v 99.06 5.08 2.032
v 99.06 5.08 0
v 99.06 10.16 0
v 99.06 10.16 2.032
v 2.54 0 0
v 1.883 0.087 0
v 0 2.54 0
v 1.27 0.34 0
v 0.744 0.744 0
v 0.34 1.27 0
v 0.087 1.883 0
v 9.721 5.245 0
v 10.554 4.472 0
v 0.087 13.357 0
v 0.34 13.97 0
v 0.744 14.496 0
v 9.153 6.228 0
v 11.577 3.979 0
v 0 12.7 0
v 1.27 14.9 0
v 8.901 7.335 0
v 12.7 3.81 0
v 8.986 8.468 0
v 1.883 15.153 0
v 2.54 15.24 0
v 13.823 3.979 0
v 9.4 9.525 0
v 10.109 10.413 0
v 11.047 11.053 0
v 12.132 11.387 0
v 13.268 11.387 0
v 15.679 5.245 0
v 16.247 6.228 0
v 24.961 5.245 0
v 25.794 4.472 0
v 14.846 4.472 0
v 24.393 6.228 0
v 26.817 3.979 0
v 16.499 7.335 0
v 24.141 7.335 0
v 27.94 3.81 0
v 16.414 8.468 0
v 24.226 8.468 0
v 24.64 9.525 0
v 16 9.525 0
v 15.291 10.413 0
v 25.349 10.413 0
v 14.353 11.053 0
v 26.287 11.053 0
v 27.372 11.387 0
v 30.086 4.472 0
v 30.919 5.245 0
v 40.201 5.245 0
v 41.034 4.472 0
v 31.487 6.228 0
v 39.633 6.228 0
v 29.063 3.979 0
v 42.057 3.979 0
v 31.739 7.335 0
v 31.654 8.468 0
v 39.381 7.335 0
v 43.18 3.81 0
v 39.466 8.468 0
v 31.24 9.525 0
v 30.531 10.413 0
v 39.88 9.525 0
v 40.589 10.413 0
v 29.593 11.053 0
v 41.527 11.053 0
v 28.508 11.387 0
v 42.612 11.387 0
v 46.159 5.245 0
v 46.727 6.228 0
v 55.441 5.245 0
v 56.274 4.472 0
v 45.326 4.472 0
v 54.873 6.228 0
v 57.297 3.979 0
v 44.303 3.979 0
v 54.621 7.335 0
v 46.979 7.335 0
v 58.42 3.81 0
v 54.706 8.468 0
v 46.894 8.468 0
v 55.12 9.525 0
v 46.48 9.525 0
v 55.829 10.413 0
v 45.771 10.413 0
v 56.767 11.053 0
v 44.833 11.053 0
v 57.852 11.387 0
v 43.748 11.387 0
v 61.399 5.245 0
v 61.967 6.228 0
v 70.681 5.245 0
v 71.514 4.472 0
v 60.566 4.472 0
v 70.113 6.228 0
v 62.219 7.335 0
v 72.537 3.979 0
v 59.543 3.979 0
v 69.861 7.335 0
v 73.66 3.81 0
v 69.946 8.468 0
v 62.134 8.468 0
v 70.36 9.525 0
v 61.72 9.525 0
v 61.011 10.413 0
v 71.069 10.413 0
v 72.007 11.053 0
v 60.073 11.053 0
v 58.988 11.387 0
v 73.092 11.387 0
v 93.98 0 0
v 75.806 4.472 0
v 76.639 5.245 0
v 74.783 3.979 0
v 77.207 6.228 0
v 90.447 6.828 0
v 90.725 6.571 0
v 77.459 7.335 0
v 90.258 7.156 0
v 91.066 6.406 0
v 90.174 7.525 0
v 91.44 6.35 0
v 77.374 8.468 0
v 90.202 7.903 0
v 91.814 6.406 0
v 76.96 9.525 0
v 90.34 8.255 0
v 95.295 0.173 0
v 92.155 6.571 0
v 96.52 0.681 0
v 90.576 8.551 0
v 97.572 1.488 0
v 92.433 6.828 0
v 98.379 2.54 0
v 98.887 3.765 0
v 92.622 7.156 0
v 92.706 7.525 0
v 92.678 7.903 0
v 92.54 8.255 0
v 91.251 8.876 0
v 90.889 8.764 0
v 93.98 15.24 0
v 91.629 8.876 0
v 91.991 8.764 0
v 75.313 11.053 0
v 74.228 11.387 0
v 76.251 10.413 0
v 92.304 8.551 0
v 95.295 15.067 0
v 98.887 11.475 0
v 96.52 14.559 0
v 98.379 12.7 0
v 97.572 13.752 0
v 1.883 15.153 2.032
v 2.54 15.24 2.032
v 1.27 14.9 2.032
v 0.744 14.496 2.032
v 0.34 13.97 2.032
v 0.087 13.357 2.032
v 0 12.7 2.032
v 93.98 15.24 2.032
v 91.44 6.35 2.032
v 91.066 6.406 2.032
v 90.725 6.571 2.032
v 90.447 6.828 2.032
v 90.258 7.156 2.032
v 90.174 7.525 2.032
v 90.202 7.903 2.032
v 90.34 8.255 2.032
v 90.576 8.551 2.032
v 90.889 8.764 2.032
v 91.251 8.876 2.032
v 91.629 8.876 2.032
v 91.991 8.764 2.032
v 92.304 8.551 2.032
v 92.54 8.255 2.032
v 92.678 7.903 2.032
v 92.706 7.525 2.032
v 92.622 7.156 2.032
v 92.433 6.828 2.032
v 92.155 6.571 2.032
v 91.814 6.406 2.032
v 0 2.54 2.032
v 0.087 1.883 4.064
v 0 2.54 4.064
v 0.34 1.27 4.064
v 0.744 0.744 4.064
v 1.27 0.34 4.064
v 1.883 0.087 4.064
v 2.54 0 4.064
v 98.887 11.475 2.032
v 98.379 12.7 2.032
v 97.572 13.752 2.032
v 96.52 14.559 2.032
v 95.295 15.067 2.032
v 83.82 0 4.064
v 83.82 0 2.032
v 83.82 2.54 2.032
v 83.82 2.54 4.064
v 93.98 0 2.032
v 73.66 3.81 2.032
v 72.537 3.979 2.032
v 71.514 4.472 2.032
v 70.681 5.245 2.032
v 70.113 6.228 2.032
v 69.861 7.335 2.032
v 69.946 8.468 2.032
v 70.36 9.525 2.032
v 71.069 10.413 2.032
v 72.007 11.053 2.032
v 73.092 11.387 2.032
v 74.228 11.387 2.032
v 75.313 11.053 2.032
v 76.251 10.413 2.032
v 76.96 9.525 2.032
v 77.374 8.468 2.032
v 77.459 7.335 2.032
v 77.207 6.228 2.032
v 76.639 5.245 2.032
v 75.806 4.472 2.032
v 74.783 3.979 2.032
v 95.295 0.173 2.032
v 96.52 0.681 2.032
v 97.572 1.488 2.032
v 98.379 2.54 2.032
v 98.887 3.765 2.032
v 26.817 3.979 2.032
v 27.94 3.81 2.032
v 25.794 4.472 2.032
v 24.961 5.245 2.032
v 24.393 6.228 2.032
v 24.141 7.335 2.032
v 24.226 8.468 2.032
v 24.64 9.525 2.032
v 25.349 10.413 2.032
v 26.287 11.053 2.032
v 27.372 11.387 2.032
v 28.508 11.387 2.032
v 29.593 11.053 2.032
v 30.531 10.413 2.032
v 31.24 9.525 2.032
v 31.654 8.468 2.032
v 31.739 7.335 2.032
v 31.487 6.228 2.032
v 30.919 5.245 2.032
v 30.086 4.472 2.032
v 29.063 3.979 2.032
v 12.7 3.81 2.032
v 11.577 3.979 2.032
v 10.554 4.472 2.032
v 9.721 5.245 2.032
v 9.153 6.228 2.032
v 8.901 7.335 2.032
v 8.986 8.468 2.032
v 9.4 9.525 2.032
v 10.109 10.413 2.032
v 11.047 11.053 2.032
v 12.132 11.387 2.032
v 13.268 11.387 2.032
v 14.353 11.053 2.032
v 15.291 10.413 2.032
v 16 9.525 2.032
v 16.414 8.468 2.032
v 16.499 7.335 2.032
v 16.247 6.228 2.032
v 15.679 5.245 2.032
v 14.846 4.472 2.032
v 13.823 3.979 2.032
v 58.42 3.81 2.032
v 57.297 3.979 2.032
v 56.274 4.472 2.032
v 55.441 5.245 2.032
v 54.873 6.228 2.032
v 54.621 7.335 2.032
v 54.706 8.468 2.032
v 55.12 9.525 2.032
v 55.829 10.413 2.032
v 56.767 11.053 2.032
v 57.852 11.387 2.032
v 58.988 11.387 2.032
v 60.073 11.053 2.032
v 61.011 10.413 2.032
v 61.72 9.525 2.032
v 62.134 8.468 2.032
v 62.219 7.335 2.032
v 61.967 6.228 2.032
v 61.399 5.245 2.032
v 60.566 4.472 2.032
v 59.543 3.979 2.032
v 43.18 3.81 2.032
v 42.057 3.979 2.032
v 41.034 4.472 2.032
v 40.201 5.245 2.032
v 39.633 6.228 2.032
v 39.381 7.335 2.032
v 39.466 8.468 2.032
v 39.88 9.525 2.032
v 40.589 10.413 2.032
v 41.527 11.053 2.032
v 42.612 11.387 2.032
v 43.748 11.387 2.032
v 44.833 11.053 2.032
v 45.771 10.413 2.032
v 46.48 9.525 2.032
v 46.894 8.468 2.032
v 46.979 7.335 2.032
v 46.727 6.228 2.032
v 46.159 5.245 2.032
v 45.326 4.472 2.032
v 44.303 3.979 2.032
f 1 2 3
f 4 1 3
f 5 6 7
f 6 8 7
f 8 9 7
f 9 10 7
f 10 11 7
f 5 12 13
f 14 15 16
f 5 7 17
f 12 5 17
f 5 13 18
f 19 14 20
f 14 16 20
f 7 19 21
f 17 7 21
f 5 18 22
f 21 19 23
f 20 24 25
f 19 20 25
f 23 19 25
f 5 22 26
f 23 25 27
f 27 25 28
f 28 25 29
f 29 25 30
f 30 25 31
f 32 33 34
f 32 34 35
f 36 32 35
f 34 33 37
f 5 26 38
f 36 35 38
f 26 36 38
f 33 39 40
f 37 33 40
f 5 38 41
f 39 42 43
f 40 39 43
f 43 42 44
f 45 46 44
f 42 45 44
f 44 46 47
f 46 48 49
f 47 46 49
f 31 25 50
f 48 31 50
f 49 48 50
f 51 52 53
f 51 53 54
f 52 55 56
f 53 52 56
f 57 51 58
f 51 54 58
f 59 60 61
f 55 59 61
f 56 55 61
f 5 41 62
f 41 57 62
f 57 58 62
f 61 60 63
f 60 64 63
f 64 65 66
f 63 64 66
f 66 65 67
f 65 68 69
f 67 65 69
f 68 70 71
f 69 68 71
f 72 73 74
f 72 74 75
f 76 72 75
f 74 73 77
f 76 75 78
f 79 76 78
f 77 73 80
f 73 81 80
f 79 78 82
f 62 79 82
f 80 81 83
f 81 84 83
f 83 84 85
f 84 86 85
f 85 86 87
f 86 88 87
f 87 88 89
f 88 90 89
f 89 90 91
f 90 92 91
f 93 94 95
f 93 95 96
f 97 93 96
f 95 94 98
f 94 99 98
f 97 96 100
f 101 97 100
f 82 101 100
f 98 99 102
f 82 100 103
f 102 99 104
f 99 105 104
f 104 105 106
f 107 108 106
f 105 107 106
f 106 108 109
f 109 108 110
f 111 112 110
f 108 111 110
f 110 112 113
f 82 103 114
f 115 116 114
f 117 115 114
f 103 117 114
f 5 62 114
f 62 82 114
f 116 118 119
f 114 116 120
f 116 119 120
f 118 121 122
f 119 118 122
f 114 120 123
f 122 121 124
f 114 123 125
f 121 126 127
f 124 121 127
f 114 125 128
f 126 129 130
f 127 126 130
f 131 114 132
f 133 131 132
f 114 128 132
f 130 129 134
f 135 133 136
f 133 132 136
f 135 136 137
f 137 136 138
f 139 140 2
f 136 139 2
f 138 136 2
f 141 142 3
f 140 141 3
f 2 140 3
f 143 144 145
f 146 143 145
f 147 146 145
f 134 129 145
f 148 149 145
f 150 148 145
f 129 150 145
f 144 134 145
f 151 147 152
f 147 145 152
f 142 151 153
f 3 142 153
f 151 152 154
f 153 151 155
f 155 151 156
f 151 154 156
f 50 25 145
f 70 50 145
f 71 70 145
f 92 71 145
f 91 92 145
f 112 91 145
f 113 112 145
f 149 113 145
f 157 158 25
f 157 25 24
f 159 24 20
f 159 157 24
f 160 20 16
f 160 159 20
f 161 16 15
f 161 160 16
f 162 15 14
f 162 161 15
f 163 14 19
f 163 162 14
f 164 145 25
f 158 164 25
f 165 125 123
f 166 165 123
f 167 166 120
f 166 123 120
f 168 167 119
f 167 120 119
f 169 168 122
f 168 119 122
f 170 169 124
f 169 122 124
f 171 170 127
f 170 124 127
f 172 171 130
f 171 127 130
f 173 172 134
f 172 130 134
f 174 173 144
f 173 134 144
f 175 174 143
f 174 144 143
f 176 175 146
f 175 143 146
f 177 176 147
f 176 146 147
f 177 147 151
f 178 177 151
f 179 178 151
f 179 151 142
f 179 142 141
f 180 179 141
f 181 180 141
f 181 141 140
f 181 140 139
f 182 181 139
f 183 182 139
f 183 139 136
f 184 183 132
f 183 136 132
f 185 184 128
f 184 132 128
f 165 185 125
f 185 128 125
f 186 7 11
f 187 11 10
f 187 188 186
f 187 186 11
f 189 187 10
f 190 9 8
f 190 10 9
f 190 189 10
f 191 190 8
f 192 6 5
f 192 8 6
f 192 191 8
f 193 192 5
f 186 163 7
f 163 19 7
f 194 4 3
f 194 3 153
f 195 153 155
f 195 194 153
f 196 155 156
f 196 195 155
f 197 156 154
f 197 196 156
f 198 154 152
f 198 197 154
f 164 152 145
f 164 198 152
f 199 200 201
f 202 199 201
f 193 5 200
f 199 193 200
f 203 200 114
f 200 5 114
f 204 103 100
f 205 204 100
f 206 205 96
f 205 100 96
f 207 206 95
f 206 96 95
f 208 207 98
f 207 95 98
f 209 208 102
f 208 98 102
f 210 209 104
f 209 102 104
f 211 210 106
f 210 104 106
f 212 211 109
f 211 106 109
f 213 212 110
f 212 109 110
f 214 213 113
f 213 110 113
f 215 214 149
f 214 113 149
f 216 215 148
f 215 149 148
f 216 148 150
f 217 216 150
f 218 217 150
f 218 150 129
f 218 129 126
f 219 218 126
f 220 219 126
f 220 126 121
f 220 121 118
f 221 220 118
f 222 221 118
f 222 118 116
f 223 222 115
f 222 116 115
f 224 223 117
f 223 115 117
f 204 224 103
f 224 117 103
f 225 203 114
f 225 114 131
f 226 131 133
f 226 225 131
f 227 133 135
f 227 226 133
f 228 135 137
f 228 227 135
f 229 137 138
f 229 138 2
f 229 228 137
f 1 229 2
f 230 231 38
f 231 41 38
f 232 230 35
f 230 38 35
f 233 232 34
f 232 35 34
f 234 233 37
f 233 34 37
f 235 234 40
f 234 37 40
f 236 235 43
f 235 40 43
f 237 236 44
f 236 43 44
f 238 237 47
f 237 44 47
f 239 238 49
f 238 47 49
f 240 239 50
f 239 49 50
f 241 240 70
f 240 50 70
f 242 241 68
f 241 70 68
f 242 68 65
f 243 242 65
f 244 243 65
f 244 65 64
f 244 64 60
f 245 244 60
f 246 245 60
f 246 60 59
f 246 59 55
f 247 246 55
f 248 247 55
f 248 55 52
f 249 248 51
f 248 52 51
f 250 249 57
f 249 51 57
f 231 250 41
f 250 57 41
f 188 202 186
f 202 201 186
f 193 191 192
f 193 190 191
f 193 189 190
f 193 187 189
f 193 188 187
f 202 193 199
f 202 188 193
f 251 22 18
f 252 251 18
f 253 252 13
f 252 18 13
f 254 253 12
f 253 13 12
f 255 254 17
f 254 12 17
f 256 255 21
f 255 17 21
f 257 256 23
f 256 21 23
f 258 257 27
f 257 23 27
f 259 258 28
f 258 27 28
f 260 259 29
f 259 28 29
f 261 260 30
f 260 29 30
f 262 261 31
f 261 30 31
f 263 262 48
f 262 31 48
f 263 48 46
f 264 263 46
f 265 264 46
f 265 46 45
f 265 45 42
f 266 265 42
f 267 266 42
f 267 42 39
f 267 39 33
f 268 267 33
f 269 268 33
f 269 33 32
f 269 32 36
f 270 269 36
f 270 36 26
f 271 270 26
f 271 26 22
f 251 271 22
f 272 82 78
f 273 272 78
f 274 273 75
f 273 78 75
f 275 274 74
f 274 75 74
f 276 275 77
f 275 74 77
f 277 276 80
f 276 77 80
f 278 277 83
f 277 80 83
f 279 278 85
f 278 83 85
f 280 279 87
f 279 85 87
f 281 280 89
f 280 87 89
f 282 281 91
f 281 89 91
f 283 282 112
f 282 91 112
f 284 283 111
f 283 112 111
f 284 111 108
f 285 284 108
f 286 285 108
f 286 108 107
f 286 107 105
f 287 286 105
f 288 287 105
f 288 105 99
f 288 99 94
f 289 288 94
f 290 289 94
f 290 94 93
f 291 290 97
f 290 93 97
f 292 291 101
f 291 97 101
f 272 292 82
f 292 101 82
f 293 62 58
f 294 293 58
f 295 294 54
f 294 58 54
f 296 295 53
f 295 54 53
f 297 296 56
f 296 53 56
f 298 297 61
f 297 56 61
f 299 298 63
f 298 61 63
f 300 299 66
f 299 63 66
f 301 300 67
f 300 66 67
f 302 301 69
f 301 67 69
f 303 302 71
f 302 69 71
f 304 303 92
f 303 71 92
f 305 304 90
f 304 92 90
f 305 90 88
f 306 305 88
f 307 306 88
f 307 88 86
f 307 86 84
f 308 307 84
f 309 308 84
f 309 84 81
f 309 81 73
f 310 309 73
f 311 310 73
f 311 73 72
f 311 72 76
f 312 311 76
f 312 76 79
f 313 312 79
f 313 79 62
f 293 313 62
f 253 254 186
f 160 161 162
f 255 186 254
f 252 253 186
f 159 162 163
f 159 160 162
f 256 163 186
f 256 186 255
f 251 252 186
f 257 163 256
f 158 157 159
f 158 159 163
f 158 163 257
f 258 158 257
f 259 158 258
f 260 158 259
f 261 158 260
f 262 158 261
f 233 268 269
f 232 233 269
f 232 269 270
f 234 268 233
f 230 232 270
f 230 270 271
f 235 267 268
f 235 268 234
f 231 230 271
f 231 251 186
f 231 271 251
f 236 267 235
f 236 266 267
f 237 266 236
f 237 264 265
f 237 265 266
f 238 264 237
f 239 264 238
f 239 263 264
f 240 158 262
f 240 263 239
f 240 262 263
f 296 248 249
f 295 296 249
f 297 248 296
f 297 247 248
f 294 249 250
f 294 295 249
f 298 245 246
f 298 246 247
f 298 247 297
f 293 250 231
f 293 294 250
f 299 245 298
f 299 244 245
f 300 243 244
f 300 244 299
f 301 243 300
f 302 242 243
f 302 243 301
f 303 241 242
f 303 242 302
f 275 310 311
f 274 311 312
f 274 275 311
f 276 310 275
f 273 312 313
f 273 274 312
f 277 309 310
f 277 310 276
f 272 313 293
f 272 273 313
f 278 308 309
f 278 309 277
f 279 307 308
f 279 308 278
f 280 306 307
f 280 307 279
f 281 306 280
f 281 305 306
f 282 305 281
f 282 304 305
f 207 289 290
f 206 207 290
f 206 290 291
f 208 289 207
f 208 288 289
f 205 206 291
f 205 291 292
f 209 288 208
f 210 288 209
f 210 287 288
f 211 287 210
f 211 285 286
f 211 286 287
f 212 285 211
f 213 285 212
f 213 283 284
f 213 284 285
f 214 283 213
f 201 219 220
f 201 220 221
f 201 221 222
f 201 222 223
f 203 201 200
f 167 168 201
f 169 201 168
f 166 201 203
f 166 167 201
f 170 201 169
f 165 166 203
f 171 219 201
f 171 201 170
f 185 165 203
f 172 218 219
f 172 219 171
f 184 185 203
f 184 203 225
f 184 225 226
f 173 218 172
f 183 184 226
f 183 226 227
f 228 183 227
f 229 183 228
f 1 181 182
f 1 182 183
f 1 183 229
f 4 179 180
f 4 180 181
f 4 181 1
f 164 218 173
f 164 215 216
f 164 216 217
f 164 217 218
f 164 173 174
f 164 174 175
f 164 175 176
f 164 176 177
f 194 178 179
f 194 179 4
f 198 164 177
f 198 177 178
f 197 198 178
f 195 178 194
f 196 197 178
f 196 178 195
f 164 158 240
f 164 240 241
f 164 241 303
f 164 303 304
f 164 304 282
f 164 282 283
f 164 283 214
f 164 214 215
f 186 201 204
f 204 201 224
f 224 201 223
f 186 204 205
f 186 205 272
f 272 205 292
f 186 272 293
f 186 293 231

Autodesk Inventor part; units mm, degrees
ref_plane "YZ Plane" through (0, 0, 0) normal (1, 0, 0) x (0, 1, 0)
ref_plane "XZ Plane" through (0, 0, 0) normal (0, 1, 0) x (-1, 0, 0)
ref_plane "XY Plane" through (0, 0, 0) normal (0, 0, 1) x (1, 0, 0)
sketch "Sketch1" plane through (0, 0, 0) normal (0, 0, 1) x (1, 0, 0)
  point P0 (0, 0)
sketch "Sketch2" plane through (0, 0, 0) normal (0, 0, 1) x (1, 0, 0)
  line L0 (0, 0) -> (99.06, 0)
  line L1 (99.06, 0) -> (99.06, 15.24)
  line L2 (99.06, 15.24) -> (0, 15.24)
  line L3 (0, 15.24) -> (0, 0)
  dimension "d0" = 15.24
  dimension "d1" = 99.06
extrude "Extrusion1" add sketch "Sketch2" along normal blind 2.032
sketch "Sketch3" plane through (0, 0, 2.032) normal (0, 0, 1) x (1, 0, 0)
  line L0 (0, 15.24) -> (0, 0) projected
  line L1 (0, 7.62) -> (99.06, 7.62)
  line L2 (99.06, 0) -> (99.06, 15.24) projected
  point P0 (12.7, 7.62)
  dimension "d14" = 12.7
hole "Hole1" at (12.7, 7.62, 2.032) direction (0, 0, -1) diameter 7.62 end through all
pattern_linear "Rectangular Pattern1" count 5 spacing 15.24 along (1, 0, 0) of "Hole1"
sketch "Sketch4" plane through (0, 0, 2.032) normal (0, 0, 1) x (1, 0, 0)
  line L0 (99.06, 0) -> (99.06, 15.24) projected
  line L1 (99.06, 7.62) -> (91.44, 7.62)
  point P0 (0, 0)
  dimension "d15" = 7.62
hole "Hole2" at (91.44, 7.62, 2.032) direction (0, 0, -1) diameter 2.54 end through all
sketch "Sketch5" plane through (0, 0, 2.032) normal (0, 0, 1) x (1, 0, 0)
  line L0 (0, 0) -> (83.82, 0)
  line L1 (83.82, 0) -> (83.82, 2.54)
  line L2 (83.82, 2.54) -> (0, 2.54)
  line L3 (0, 2.54) -> (0, 0)
  dimension "d23" = 83.82
  dimension "d24" = 2.54
extrude "Extrusion2" add sketch "Sketch5" along normal blind 2.032
fillet "Fillet1" radius 5.08 2 edges at (99.06, 15.24, 1.016) (99.06, 0, 1.016)
fillet "Fillet2" radius 2.54 2 edges at (0, 15.24, 1.016) (0, 0, 2.032)
equation "\"d15\" = 0.5 * d0"
properties part number "Lopez_LeftLeg" material "Polypropylene"
